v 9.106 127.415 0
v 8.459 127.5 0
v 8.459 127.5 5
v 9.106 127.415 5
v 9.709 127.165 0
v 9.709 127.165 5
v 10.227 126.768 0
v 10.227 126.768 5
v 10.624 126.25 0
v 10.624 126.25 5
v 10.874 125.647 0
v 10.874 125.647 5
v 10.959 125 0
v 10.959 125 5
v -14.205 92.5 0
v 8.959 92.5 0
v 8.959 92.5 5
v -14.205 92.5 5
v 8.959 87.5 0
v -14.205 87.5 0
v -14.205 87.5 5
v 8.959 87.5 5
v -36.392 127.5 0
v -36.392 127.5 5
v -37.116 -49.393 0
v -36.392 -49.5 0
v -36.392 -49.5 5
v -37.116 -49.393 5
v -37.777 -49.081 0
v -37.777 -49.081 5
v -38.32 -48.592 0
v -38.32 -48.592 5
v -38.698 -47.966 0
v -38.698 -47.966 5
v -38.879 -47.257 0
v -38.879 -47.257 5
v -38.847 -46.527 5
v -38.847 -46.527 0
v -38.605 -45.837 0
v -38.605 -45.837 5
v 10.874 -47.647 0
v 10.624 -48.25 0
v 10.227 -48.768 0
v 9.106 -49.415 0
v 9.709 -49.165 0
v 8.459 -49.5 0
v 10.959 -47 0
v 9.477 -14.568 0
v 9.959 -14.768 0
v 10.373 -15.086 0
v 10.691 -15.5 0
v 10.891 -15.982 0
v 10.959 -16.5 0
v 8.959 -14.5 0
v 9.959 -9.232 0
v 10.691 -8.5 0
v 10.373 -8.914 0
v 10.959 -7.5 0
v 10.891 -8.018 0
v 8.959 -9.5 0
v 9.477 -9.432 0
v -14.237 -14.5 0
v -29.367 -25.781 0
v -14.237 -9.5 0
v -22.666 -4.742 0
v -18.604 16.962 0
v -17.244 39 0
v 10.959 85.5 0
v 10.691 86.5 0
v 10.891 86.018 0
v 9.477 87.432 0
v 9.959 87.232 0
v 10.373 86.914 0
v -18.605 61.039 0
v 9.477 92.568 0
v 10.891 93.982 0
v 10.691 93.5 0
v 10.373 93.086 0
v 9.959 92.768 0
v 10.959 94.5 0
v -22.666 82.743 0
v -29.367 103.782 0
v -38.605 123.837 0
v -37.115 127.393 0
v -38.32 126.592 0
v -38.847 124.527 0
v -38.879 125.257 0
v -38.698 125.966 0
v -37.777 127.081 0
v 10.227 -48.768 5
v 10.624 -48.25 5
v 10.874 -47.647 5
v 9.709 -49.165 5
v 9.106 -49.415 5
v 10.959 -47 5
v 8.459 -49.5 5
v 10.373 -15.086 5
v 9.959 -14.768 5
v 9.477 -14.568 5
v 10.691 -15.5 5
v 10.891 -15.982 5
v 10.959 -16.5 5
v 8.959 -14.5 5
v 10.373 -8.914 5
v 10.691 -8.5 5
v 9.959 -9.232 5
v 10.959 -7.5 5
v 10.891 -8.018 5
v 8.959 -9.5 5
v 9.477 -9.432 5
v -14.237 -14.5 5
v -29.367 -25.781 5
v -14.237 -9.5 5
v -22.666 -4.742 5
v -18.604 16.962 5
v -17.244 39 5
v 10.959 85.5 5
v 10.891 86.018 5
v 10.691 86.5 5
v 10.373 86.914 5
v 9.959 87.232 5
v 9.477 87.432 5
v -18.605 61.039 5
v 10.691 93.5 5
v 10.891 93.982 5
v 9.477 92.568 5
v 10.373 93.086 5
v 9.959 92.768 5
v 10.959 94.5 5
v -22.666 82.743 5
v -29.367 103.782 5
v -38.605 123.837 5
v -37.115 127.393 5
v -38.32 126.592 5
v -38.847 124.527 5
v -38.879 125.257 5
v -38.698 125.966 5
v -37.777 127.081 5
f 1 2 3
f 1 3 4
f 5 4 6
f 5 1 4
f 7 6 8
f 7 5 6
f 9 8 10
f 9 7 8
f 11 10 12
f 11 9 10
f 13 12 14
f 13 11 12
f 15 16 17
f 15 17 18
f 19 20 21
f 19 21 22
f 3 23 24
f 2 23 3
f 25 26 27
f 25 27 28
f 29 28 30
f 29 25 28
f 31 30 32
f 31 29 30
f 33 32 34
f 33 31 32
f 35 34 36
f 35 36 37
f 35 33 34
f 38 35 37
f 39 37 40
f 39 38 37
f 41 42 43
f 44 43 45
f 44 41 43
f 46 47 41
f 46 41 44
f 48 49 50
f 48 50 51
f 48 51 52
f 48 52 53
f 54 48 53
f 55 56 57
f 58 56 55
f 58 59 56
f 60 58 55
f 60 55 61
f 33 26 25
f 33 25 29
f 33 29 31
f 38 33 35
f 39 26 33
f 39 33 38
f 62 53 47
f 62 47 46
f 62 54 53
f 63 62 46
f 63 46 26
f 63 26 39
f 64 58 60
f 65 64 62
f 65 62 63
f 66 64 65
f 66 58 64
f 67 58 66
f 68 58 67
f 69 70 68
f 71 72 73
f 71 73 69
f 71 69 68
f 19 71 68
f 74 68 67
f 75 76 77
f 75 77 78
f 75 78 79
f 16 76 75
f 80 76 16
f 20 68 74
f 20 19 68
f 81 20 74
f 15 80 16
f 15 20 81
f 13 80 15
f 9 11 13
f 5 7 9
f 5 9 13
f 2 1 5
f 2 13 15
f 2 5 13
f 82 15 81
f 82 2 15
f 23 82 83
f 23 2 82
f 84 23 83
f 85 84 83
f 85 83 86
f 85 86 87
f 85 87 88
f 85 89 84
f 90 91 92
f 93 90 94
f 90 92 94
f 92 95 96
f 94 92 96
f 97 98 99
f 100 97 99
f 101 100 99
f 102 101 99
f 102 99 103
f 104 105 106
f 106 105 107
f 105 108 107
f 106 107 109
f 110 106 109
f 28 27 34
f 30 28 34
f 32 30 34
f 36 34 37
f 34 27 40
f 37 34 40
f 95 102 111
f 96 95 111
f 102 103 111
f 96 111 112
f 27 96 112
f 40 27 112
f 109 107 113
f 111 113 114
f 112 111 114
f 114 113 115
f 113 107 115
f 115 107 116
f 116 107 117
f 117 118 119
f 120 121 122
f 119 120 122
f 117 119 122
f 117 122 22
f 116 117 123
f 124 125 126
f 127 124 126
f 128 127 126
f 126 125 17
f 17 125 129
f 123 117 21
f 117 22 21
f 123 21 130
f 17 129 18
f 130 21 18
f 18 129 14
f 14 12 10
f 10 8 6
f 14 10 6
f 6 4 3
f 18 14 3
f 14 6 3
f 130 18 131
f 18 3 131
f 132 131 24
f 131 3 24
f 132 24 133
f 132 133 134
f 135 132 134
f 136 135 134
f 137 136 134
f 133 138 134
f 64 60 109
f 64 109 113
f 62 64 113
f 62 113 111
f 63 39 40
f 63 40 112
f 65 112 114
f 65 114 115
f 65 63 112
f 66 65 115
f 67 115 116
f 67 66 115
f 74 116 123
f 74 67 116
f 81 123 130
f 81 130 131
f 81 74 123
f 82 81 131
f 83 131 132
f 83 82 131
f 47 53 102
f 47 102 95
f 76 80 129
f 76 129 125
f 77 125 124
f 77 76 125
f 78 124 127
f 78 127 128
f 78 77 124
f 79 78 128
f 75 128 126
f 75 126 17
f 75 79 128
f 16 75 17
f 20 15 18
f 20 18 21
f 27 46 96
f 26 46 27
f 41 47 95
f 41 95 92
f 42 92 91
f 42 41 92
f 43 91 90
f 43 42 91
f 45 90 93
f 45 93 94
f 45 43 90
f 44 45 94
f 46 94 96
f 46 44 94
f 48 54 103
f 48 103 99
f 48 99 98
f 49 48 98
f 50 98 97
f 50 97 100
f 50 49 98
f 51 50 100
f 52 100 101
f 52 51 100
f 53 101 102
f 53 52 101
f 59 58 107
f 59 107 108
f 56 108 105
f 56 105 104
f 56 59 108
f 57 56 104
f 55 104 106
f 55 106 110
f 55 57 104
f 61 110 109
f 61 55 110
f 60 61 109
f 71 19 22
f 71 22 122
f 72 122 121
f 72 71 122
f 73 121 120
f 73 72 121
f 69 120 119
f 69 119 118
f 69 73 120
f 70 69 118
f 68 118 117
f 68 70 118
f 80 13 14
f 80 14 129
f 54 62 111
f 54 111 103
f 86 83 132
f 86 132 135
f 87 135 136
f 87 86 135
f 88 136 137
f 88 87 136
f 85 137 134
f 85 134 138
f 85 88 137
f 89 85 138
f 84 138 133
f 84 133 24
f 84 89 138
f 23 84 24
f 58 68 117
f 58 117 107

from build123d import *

# Parameters (mm, degrees)
RESSALTO_EXTRUS_O1_DEPTH = 5


with BuildPart() as part:
    # Model → Ressalto-extrusão1 (new body)
    with BuildSketch(Plane.XY):
        with BuildLine():
            Line((8.958908168, 92.500001378), (-14.205034542, 92.500001378))
            Line((-14.205034542, 92.500001378), (-14.205034542, 87.500001303))
            Line((-14.205034542, 87.500001303), (8.958908168, 87.500001303))
            ThreePointArc((8.958908168, 87.500001303), (10.37312173, 86.914214866), (10.958908168, 85.500001303))
            Line((10.958908168, 85.500001303), (10.958908168, -7.500000142))
            ThreePointArc((10.958908168, -7.500000142), (10.37312173, -8.914213705), (8.958908168, -9.500000142))
            Line((8.958908168, -9.500000142), (-14.237425511, -9.500000142))
            Line((-14.237425511, -9.500000142), (-14.237425511, -14.500000217))
            Line((-14.237425511, -14.500000217), (8.958908168, -14.500000217))
            ThreePointArc((8.958908168, -14.500000217), (10.37312173, -15.085786654), (10.958908168, -16.500000217))
            Line((10.958908168, -16.500000217), (10.958908168, -47.000089001))
            ThreePointArc((10.958908168, -47.000089001), (10.226675121, -48.767855954), (8.458908168, -49.500089001))
            Line((8.458908168, -49.500089001), (-36.392181846, -49.500089001))
            ThreePointArc((-36.392181846, -49.500089001), (-38.532153082, -48.292576181), (-38.604890155, -45.836507488))
            ThreePointArc((-38.604890155, -45.836507488), (-17.243723681, 39.000273479), (-38.605225502, 123.836970009))
            ThreePointArc((-38.605225502, 123.836970009), (-38.53196676, 126.292709214), (-36.392181846, 127.499913592))
            Line((-36.392181846, 127.499913592), (8.458908168, 127.499913592))
            ThreePointArc((8.458908168, 127.499913592), (10.226675121, 126.767680545), (10.958908168, 124.999913592))
            Line((10.958908168, 124.999913592), (10.958908168, 94.500001378))
            ThreePointArc((10.958908168, 94.500001378), (10.37312173, 93.085787815), (8.958908168, 92.500001378))
        make_face()
    extrude(amount=RESSALTO_EXTRUS_O1_DEPTH)


solid = part.part
